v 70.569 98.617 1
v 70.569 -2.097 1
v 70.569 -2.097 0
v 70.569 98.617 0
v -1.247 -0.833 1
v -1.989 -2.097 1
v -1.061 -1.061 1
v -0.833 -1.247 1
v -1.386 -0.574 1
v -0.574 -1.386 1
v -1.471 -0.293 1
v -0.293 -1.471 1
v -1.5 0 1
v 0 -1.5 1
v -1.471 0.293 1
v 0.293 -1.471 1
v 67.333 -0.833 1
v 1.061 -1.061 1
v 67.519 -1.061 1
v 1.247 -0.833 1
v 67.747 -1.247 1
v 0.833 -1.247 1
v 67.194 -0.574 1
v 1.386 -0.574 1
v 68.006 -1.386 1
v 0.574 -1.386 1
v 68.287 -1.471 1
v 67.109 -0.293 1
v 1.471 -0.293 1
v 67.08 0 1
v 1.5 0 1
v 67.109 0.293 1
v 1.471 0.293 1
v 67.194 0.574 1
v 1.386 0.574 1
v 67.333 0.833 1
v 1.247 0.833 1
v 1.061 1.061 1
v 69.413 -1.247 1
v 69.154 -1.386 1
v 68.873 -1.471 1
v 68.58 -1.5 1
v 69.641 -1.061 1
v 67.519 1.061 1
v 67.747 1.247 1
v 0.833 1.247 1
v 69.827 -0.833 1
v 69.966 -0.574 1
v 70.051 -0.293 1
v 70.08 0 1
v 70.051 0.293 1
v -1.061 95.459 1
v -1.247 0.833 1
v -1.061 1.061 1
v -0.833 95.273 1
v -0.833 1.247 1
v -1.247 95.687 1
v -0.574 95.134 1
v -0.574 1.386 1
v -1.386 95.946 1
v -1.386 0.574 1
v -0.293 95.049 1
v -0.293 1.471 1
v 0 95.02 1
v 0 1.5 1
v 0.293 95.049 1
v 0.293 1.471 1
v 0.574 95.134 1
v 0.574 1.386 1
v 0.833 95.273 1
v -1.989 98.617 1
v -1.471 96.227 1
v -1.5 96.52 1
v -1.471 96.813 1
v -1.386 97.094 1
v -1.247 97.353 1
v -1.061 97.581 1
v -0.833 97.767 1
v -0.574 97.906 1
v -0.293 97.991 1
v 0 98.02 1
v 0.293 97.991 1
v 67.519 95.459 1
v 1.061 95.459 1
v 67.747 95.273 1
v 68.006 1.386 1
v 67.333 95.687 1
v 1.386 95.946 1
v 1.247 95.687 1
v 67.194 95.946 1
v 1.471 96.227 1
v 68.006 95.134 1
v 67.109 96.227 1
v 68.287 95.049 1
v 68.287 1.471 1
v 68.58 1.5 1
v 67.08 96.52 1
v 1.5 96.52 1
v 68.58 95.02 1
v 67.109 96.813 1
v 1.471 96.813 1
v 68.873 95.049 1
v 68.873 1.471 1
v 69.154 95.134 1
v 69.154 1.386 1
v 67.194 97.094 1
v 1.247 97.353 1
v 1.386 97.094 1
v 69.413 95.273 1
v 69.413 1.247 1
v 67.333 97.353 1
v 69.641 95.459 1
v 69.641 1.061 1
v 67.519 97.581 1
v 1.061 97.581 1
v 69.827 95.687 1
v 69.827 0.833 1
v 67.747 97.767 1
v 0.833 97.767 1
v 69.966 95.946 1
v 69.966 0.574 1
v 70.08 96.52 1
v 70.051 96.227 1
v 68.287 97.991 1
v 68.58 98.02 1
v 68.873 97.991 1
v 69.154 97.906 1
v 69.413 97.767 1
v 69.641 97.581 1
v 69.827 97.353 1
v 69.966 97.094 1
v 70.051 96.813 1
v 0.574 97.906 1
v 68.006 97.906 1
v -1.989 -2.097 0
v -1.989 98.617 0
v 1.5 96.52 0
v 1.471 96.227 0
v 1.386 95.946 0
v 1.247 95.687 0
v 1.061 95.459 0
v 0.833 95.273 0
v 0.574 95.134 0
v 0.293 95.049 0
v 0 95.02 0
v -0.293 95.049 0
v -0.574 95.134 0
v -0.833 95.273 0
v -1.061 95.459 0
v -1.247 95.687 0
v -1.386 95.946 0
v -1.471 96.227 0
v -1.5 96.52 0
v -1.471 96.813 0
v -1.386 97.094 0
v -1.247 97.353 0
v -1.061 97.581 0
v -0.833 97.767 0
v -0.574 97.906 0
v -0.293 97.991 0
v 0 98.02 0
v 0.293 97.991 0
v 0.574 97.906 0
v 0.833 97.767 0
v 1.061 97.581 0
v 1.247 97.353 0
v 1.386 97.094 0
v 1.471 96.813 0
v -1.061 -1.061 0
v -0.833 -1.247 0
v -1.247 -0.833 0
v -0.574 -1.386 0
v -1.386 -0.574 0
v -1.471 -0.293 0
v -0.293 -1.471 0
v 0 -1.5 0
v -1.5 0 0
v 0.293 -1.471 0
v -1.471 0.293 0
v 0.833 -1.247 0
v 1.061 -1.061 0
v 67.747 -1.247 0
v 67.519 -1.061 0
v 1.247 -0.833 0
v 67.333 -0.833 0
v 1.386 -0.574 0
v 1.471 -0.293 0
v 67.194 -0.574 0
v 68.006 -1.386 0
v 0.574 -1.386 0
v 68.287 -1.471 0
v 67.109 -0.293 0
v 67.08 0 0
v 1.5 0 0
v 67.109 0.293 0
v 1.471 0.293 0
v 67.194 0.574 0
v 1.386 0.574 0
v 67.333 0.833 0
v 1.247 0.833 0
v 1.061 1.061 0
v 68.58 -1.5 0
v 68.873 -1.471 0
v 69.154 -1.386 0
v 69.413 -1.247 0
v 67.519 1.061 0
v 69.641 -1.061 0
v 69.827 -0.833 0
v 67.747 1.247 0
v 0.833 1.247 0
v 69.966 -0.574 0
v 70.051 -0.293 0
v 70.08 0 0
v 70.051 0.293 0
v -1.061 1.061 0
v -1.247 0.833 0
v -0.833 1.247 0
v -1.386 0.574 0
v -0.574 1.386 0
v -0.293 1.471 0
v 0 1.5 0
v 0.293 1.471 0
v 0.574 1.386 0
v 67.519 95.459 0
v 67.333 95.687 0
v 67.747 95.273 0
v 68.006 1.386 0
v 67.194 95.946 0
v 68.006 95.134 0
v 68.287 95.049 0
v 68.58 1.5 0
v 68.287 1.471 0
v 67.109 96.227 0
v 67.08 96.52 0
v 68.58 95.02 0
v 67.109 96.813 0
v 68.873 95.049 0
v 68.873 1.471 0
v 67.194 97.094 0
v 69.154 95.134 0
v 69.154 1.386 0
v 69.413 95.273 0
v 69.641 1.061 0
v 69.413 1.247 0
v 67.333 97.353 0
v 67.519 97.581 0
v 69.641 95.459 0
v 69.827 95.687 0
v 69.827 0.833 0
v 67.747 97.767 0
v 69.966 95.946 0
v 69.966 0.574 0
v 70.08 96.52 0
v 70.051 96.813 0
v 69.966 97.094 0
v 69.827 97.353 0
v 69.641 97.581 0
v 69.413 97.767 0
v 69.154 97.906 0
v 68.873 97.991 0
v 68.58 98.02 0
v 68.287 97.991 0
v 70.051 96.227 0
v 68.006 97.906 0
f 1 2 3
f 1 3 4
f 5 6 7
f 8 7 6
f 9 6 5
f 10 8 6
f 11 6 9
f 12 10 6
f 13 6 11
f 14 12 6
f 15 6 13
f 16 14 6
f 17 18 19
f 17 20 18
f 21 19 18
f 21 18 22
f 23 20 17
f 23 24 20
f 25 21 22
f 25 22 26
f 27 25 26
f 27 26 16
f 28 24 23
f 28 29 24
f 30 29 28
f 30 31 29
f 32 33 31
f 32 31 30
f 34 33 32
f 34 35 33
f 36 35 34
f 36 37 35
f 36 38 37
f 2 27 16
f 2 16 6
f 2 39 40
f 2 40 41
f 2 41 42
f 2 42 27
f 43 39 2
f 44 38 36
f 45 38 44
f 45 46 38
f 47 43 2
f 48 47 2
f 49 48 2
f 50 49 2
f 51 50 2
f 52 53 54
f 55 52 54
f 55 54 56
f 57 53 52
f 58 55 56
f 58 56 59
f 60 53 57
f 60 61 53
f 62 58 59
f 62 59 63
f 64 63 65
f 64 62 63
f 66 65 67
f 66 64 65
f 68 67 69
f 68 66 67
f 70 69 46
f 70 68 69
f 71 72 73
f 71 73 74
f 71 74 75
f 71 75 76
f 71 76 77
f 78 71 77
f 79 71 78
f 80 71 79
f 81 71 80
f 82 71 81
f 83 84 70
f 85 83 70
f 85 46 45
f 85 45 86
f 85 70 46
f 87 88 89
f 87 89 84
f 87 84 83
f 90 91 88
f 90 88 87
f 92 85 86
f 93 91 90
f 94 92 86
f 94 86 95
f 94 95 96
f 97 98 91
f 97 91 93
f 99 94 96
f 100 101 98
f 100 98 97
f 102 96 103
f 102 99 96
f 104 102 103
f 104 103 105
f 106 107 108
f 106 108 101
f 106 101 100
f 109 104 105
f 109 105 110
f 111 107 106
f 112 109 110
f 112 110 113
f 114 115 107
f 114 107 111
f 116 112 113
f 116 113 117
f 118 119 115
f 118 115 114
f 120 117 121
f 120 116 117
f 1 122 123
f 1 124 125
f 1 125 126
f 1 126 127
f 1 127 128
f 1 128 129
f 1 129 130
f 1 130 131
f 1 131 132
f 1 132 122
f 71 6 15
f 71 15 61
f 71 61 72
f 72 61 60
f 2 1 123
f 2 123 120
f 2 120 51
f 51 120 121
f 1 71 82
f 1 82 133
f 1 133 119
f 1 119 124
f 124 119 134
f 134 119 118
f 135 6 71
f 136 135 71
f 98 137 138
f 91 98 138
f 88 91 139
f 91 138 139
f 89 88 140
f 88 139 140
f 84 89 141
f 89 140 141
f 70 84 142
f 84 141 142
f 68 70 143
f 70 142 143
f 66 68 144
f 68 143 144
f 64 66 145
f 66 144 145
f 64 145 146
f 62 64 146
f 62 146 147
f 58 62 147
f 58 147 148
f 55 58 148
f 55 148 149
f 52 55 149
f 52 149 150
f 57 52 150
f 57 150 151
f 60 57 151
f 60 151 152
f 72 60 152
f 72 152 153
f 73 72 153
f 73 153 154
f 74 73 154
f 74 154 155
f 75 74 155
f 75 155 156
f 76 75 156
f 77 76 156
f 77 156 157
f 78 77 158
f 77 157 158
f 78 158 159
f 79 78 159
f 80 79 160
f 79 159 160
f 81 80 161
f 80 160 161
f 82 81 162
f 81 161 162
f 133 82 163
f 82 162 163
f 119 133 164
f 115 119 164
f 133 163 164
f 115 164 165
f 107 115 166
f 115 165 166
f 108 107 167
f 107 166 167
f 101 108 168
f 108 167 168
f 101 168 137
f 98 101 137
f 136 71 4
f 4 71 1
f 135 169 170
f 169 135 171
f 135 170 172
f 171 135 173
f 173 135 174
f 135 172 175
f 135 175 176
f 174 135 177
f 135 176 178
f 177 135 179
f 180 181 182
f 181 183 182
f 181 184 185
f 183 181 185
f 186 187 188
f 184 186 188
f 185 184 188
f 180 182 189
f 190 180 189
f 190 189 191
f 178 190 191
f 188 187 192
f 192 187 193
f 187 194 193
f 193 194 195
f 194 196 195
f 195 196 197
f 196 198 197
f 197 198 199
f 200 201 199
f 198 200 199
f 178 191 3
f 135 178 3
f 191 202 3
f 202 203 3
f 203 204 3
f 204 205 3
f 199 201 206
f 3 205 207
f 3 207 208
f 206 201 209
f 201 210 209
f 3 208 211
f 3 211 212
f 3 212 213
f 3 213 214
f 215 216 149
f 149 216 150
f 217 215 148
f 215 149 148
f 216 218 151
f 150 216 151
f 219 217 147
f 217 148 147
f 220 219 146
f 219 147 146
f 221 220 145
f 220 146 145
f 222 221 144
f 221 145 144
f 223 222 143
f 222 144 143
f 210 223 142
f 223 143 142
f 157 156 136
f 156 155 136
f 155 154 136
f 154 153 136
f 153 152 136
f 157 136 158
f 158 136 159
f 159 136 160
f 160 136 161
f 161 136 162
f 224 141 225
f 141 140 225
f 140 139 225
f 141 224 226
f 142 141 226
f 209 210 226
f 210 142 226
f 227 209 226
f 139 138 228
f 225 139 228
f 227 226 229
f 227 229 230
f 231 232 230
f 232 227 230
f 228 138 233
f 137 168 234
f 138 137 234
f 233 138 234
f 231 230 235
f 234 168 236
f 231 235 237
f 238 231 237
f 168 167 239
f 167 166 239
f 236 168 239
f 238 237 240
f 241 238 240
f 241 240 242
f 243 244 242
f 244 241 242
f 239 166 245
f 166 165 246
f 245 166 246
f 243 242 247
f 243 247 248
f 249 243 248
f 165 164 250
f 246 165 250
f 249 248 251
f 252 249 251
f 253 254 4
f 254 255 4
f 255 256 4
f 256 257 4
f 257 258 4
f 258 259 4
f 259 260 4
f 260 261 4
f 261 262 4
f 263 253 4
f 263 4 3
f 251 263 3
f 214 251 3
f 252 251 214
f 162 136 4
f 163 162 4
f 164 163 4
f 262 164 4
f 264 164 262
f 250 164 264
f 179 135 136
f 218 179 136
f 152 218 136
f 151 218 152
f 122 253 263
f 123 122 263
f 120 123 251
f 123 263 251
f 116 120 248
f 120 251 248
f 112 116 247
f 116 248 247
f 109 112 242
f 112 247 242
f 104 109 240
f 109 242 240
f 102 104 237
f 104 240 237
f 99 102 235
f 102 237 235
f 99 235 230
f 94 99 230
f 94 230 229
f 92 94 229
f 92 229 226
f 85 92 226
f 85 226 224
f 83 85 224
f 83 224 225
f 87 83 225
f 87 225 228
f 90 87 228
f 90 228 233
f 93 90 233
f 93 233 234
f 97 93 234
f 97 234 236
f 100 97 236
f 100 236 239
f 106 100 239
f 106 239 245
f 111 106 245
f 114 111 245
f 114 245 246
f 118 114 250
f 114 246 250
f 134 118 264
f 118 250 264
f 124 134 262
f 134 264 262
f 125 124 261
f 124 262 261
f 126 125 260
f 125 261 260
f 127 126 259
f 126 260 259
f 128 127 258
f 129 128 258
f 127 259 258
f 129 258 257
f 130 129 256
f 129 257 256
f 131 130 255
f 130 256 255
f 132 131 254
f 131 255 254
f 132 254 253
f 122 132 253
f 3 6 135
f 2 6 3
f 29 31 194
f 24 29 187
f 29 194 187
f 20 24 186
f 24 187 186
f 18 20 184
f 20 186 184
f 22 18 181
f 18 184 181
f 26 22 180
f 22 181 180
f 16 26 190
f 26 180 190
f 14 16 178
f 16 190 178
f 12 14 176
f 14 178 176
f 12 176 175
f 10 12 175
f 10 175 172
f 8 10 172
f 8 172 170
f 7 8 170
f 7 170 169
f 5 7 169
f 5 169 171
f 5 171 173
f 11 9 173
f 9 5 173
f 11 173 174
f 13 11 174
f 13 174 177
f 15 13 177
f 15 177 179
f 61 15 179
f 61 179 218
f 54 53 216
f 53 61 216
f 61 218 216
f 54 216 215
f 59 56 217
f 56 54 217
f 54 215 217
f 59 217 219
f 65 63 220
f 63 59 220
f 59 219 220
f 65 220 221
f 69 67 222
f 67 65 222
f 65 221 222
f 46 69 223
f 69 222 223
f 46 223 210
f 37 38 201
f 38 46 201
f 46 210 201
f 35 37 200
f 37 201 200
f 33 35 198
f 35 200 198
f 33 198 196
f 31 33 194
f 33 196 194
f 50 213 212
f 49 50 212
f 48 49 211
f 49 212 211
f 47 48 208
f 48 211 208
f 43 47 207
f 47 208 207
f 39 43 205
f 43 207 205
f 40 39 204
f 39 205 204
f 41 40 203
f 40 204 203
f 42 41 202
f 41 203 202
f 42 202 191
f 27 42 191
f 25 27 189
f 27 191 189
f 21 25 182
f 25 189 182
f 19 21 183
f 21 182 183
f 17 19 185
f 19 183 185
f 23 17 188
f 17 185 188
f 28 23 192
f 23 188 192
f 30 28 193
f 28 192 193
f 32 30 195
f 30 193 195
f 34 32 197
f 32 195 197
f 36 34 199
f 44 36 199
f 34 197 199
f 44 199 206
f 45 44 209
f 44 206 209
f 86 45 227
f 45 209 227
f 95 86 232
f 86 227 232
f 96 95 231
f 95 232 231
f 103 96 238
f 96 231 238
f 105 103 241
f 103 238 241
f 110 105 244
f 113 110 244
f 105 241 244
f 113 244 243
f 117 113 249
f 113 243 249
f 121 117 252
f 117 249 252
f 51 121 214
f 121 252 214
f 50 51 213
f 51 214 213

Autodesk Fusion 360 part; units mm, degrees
sketch "スケッチ1" plane through (0, 0, 0) normal (0, 0, 1) x (1, 0, 0)
  line L0 (0, 0) -> (68.58, 0)
  line L1 (0, 0) -> (68.58, 0)
  line L2 (68.58, 0) -> (68.58, 96.52)
  line L3 (68.58, 96.52) -> (0, 96.52)
  line L4 (0, 96.52) -> (0, 0)
  circle A0 centre (0, 0) radius 1.5
  circle A1 centre (68.58, 0) radius 1.5
  circle A2 centre (0, 96.52) radius 1.5
  circle A3 centre (68.58, 96.52) radius 1.5
  line L5 (-5, -5) -> (73.58, -5)
  line L6 (73.58, -5) -> (73.58, 101.52)
  line L7 (73.58, 101.52) -> (-5, 101.52)
  line L8 (-5, 101.52) -> (-5, -5)
  dimension "d1" = 68.58
  dimension "d2" = 68.58
  dimension "d3" = 96.52
  dimension "d4" = 3
  dimension "d5" = 3
  dimension "d6" = 3
  dimension "d7" = 3
  dimension "d8" = 78.58
  dimension "d9" = 106.52
extrude "押し出し1" add sketch "スケッチ1" along normal blind 2 contours L0 L1 L2 L3 L4 A0 A1 A2 A3 | L5 L6 L7 L8
sketch "スケッチ2" plane through (0, 0, 2) normal (0, 0, 1) x (-1, 0, 0)
  circle A0 centre (0, 0) radius 1.5
  circle A1 centre (-68.58, -96.52) radius 1.5
  circle A2 centre (0, -96.52) radius 1.5
  circle A3 centre (-68.58, 0) radius 1.5
  line L0 (5, -101.52) -> (5, 5)
  line L1 (5, 5) -> (-73.58, 5)
  line L2 (-73.58, 5) -> (-73.58, -101.52)
  line L3 (-73.58, -101.52) -> (5, -101.52)
  line L4 (5, 2.0966) -> (-73.58, 2.0966)
  line L5 (1.9893, 5) -> (1.9893, -101.52)
  line L6 (-70.5693, 5) -> (-70.5693, -101.52)
  line L7 (5, -98.6166) -> (-73.58, -98.6166)
extrude "押し出し2" cut sketch "スケッチ2" against normal blind 2 contours L0 L3 L5 L7 | L0 L4 L5 L7 | L3 L5 L6 L7 | L0 L1 L4 L5 | L2 L3 L6 L7 | L1 L4 L5 L6 | L2 L4 L6 L7 | L1 L2 L4 L6
extrude "押し出し3" cut 1 faces at (45.4465, 32.5919, 2) along direction (0, 0, -1) blind 1
